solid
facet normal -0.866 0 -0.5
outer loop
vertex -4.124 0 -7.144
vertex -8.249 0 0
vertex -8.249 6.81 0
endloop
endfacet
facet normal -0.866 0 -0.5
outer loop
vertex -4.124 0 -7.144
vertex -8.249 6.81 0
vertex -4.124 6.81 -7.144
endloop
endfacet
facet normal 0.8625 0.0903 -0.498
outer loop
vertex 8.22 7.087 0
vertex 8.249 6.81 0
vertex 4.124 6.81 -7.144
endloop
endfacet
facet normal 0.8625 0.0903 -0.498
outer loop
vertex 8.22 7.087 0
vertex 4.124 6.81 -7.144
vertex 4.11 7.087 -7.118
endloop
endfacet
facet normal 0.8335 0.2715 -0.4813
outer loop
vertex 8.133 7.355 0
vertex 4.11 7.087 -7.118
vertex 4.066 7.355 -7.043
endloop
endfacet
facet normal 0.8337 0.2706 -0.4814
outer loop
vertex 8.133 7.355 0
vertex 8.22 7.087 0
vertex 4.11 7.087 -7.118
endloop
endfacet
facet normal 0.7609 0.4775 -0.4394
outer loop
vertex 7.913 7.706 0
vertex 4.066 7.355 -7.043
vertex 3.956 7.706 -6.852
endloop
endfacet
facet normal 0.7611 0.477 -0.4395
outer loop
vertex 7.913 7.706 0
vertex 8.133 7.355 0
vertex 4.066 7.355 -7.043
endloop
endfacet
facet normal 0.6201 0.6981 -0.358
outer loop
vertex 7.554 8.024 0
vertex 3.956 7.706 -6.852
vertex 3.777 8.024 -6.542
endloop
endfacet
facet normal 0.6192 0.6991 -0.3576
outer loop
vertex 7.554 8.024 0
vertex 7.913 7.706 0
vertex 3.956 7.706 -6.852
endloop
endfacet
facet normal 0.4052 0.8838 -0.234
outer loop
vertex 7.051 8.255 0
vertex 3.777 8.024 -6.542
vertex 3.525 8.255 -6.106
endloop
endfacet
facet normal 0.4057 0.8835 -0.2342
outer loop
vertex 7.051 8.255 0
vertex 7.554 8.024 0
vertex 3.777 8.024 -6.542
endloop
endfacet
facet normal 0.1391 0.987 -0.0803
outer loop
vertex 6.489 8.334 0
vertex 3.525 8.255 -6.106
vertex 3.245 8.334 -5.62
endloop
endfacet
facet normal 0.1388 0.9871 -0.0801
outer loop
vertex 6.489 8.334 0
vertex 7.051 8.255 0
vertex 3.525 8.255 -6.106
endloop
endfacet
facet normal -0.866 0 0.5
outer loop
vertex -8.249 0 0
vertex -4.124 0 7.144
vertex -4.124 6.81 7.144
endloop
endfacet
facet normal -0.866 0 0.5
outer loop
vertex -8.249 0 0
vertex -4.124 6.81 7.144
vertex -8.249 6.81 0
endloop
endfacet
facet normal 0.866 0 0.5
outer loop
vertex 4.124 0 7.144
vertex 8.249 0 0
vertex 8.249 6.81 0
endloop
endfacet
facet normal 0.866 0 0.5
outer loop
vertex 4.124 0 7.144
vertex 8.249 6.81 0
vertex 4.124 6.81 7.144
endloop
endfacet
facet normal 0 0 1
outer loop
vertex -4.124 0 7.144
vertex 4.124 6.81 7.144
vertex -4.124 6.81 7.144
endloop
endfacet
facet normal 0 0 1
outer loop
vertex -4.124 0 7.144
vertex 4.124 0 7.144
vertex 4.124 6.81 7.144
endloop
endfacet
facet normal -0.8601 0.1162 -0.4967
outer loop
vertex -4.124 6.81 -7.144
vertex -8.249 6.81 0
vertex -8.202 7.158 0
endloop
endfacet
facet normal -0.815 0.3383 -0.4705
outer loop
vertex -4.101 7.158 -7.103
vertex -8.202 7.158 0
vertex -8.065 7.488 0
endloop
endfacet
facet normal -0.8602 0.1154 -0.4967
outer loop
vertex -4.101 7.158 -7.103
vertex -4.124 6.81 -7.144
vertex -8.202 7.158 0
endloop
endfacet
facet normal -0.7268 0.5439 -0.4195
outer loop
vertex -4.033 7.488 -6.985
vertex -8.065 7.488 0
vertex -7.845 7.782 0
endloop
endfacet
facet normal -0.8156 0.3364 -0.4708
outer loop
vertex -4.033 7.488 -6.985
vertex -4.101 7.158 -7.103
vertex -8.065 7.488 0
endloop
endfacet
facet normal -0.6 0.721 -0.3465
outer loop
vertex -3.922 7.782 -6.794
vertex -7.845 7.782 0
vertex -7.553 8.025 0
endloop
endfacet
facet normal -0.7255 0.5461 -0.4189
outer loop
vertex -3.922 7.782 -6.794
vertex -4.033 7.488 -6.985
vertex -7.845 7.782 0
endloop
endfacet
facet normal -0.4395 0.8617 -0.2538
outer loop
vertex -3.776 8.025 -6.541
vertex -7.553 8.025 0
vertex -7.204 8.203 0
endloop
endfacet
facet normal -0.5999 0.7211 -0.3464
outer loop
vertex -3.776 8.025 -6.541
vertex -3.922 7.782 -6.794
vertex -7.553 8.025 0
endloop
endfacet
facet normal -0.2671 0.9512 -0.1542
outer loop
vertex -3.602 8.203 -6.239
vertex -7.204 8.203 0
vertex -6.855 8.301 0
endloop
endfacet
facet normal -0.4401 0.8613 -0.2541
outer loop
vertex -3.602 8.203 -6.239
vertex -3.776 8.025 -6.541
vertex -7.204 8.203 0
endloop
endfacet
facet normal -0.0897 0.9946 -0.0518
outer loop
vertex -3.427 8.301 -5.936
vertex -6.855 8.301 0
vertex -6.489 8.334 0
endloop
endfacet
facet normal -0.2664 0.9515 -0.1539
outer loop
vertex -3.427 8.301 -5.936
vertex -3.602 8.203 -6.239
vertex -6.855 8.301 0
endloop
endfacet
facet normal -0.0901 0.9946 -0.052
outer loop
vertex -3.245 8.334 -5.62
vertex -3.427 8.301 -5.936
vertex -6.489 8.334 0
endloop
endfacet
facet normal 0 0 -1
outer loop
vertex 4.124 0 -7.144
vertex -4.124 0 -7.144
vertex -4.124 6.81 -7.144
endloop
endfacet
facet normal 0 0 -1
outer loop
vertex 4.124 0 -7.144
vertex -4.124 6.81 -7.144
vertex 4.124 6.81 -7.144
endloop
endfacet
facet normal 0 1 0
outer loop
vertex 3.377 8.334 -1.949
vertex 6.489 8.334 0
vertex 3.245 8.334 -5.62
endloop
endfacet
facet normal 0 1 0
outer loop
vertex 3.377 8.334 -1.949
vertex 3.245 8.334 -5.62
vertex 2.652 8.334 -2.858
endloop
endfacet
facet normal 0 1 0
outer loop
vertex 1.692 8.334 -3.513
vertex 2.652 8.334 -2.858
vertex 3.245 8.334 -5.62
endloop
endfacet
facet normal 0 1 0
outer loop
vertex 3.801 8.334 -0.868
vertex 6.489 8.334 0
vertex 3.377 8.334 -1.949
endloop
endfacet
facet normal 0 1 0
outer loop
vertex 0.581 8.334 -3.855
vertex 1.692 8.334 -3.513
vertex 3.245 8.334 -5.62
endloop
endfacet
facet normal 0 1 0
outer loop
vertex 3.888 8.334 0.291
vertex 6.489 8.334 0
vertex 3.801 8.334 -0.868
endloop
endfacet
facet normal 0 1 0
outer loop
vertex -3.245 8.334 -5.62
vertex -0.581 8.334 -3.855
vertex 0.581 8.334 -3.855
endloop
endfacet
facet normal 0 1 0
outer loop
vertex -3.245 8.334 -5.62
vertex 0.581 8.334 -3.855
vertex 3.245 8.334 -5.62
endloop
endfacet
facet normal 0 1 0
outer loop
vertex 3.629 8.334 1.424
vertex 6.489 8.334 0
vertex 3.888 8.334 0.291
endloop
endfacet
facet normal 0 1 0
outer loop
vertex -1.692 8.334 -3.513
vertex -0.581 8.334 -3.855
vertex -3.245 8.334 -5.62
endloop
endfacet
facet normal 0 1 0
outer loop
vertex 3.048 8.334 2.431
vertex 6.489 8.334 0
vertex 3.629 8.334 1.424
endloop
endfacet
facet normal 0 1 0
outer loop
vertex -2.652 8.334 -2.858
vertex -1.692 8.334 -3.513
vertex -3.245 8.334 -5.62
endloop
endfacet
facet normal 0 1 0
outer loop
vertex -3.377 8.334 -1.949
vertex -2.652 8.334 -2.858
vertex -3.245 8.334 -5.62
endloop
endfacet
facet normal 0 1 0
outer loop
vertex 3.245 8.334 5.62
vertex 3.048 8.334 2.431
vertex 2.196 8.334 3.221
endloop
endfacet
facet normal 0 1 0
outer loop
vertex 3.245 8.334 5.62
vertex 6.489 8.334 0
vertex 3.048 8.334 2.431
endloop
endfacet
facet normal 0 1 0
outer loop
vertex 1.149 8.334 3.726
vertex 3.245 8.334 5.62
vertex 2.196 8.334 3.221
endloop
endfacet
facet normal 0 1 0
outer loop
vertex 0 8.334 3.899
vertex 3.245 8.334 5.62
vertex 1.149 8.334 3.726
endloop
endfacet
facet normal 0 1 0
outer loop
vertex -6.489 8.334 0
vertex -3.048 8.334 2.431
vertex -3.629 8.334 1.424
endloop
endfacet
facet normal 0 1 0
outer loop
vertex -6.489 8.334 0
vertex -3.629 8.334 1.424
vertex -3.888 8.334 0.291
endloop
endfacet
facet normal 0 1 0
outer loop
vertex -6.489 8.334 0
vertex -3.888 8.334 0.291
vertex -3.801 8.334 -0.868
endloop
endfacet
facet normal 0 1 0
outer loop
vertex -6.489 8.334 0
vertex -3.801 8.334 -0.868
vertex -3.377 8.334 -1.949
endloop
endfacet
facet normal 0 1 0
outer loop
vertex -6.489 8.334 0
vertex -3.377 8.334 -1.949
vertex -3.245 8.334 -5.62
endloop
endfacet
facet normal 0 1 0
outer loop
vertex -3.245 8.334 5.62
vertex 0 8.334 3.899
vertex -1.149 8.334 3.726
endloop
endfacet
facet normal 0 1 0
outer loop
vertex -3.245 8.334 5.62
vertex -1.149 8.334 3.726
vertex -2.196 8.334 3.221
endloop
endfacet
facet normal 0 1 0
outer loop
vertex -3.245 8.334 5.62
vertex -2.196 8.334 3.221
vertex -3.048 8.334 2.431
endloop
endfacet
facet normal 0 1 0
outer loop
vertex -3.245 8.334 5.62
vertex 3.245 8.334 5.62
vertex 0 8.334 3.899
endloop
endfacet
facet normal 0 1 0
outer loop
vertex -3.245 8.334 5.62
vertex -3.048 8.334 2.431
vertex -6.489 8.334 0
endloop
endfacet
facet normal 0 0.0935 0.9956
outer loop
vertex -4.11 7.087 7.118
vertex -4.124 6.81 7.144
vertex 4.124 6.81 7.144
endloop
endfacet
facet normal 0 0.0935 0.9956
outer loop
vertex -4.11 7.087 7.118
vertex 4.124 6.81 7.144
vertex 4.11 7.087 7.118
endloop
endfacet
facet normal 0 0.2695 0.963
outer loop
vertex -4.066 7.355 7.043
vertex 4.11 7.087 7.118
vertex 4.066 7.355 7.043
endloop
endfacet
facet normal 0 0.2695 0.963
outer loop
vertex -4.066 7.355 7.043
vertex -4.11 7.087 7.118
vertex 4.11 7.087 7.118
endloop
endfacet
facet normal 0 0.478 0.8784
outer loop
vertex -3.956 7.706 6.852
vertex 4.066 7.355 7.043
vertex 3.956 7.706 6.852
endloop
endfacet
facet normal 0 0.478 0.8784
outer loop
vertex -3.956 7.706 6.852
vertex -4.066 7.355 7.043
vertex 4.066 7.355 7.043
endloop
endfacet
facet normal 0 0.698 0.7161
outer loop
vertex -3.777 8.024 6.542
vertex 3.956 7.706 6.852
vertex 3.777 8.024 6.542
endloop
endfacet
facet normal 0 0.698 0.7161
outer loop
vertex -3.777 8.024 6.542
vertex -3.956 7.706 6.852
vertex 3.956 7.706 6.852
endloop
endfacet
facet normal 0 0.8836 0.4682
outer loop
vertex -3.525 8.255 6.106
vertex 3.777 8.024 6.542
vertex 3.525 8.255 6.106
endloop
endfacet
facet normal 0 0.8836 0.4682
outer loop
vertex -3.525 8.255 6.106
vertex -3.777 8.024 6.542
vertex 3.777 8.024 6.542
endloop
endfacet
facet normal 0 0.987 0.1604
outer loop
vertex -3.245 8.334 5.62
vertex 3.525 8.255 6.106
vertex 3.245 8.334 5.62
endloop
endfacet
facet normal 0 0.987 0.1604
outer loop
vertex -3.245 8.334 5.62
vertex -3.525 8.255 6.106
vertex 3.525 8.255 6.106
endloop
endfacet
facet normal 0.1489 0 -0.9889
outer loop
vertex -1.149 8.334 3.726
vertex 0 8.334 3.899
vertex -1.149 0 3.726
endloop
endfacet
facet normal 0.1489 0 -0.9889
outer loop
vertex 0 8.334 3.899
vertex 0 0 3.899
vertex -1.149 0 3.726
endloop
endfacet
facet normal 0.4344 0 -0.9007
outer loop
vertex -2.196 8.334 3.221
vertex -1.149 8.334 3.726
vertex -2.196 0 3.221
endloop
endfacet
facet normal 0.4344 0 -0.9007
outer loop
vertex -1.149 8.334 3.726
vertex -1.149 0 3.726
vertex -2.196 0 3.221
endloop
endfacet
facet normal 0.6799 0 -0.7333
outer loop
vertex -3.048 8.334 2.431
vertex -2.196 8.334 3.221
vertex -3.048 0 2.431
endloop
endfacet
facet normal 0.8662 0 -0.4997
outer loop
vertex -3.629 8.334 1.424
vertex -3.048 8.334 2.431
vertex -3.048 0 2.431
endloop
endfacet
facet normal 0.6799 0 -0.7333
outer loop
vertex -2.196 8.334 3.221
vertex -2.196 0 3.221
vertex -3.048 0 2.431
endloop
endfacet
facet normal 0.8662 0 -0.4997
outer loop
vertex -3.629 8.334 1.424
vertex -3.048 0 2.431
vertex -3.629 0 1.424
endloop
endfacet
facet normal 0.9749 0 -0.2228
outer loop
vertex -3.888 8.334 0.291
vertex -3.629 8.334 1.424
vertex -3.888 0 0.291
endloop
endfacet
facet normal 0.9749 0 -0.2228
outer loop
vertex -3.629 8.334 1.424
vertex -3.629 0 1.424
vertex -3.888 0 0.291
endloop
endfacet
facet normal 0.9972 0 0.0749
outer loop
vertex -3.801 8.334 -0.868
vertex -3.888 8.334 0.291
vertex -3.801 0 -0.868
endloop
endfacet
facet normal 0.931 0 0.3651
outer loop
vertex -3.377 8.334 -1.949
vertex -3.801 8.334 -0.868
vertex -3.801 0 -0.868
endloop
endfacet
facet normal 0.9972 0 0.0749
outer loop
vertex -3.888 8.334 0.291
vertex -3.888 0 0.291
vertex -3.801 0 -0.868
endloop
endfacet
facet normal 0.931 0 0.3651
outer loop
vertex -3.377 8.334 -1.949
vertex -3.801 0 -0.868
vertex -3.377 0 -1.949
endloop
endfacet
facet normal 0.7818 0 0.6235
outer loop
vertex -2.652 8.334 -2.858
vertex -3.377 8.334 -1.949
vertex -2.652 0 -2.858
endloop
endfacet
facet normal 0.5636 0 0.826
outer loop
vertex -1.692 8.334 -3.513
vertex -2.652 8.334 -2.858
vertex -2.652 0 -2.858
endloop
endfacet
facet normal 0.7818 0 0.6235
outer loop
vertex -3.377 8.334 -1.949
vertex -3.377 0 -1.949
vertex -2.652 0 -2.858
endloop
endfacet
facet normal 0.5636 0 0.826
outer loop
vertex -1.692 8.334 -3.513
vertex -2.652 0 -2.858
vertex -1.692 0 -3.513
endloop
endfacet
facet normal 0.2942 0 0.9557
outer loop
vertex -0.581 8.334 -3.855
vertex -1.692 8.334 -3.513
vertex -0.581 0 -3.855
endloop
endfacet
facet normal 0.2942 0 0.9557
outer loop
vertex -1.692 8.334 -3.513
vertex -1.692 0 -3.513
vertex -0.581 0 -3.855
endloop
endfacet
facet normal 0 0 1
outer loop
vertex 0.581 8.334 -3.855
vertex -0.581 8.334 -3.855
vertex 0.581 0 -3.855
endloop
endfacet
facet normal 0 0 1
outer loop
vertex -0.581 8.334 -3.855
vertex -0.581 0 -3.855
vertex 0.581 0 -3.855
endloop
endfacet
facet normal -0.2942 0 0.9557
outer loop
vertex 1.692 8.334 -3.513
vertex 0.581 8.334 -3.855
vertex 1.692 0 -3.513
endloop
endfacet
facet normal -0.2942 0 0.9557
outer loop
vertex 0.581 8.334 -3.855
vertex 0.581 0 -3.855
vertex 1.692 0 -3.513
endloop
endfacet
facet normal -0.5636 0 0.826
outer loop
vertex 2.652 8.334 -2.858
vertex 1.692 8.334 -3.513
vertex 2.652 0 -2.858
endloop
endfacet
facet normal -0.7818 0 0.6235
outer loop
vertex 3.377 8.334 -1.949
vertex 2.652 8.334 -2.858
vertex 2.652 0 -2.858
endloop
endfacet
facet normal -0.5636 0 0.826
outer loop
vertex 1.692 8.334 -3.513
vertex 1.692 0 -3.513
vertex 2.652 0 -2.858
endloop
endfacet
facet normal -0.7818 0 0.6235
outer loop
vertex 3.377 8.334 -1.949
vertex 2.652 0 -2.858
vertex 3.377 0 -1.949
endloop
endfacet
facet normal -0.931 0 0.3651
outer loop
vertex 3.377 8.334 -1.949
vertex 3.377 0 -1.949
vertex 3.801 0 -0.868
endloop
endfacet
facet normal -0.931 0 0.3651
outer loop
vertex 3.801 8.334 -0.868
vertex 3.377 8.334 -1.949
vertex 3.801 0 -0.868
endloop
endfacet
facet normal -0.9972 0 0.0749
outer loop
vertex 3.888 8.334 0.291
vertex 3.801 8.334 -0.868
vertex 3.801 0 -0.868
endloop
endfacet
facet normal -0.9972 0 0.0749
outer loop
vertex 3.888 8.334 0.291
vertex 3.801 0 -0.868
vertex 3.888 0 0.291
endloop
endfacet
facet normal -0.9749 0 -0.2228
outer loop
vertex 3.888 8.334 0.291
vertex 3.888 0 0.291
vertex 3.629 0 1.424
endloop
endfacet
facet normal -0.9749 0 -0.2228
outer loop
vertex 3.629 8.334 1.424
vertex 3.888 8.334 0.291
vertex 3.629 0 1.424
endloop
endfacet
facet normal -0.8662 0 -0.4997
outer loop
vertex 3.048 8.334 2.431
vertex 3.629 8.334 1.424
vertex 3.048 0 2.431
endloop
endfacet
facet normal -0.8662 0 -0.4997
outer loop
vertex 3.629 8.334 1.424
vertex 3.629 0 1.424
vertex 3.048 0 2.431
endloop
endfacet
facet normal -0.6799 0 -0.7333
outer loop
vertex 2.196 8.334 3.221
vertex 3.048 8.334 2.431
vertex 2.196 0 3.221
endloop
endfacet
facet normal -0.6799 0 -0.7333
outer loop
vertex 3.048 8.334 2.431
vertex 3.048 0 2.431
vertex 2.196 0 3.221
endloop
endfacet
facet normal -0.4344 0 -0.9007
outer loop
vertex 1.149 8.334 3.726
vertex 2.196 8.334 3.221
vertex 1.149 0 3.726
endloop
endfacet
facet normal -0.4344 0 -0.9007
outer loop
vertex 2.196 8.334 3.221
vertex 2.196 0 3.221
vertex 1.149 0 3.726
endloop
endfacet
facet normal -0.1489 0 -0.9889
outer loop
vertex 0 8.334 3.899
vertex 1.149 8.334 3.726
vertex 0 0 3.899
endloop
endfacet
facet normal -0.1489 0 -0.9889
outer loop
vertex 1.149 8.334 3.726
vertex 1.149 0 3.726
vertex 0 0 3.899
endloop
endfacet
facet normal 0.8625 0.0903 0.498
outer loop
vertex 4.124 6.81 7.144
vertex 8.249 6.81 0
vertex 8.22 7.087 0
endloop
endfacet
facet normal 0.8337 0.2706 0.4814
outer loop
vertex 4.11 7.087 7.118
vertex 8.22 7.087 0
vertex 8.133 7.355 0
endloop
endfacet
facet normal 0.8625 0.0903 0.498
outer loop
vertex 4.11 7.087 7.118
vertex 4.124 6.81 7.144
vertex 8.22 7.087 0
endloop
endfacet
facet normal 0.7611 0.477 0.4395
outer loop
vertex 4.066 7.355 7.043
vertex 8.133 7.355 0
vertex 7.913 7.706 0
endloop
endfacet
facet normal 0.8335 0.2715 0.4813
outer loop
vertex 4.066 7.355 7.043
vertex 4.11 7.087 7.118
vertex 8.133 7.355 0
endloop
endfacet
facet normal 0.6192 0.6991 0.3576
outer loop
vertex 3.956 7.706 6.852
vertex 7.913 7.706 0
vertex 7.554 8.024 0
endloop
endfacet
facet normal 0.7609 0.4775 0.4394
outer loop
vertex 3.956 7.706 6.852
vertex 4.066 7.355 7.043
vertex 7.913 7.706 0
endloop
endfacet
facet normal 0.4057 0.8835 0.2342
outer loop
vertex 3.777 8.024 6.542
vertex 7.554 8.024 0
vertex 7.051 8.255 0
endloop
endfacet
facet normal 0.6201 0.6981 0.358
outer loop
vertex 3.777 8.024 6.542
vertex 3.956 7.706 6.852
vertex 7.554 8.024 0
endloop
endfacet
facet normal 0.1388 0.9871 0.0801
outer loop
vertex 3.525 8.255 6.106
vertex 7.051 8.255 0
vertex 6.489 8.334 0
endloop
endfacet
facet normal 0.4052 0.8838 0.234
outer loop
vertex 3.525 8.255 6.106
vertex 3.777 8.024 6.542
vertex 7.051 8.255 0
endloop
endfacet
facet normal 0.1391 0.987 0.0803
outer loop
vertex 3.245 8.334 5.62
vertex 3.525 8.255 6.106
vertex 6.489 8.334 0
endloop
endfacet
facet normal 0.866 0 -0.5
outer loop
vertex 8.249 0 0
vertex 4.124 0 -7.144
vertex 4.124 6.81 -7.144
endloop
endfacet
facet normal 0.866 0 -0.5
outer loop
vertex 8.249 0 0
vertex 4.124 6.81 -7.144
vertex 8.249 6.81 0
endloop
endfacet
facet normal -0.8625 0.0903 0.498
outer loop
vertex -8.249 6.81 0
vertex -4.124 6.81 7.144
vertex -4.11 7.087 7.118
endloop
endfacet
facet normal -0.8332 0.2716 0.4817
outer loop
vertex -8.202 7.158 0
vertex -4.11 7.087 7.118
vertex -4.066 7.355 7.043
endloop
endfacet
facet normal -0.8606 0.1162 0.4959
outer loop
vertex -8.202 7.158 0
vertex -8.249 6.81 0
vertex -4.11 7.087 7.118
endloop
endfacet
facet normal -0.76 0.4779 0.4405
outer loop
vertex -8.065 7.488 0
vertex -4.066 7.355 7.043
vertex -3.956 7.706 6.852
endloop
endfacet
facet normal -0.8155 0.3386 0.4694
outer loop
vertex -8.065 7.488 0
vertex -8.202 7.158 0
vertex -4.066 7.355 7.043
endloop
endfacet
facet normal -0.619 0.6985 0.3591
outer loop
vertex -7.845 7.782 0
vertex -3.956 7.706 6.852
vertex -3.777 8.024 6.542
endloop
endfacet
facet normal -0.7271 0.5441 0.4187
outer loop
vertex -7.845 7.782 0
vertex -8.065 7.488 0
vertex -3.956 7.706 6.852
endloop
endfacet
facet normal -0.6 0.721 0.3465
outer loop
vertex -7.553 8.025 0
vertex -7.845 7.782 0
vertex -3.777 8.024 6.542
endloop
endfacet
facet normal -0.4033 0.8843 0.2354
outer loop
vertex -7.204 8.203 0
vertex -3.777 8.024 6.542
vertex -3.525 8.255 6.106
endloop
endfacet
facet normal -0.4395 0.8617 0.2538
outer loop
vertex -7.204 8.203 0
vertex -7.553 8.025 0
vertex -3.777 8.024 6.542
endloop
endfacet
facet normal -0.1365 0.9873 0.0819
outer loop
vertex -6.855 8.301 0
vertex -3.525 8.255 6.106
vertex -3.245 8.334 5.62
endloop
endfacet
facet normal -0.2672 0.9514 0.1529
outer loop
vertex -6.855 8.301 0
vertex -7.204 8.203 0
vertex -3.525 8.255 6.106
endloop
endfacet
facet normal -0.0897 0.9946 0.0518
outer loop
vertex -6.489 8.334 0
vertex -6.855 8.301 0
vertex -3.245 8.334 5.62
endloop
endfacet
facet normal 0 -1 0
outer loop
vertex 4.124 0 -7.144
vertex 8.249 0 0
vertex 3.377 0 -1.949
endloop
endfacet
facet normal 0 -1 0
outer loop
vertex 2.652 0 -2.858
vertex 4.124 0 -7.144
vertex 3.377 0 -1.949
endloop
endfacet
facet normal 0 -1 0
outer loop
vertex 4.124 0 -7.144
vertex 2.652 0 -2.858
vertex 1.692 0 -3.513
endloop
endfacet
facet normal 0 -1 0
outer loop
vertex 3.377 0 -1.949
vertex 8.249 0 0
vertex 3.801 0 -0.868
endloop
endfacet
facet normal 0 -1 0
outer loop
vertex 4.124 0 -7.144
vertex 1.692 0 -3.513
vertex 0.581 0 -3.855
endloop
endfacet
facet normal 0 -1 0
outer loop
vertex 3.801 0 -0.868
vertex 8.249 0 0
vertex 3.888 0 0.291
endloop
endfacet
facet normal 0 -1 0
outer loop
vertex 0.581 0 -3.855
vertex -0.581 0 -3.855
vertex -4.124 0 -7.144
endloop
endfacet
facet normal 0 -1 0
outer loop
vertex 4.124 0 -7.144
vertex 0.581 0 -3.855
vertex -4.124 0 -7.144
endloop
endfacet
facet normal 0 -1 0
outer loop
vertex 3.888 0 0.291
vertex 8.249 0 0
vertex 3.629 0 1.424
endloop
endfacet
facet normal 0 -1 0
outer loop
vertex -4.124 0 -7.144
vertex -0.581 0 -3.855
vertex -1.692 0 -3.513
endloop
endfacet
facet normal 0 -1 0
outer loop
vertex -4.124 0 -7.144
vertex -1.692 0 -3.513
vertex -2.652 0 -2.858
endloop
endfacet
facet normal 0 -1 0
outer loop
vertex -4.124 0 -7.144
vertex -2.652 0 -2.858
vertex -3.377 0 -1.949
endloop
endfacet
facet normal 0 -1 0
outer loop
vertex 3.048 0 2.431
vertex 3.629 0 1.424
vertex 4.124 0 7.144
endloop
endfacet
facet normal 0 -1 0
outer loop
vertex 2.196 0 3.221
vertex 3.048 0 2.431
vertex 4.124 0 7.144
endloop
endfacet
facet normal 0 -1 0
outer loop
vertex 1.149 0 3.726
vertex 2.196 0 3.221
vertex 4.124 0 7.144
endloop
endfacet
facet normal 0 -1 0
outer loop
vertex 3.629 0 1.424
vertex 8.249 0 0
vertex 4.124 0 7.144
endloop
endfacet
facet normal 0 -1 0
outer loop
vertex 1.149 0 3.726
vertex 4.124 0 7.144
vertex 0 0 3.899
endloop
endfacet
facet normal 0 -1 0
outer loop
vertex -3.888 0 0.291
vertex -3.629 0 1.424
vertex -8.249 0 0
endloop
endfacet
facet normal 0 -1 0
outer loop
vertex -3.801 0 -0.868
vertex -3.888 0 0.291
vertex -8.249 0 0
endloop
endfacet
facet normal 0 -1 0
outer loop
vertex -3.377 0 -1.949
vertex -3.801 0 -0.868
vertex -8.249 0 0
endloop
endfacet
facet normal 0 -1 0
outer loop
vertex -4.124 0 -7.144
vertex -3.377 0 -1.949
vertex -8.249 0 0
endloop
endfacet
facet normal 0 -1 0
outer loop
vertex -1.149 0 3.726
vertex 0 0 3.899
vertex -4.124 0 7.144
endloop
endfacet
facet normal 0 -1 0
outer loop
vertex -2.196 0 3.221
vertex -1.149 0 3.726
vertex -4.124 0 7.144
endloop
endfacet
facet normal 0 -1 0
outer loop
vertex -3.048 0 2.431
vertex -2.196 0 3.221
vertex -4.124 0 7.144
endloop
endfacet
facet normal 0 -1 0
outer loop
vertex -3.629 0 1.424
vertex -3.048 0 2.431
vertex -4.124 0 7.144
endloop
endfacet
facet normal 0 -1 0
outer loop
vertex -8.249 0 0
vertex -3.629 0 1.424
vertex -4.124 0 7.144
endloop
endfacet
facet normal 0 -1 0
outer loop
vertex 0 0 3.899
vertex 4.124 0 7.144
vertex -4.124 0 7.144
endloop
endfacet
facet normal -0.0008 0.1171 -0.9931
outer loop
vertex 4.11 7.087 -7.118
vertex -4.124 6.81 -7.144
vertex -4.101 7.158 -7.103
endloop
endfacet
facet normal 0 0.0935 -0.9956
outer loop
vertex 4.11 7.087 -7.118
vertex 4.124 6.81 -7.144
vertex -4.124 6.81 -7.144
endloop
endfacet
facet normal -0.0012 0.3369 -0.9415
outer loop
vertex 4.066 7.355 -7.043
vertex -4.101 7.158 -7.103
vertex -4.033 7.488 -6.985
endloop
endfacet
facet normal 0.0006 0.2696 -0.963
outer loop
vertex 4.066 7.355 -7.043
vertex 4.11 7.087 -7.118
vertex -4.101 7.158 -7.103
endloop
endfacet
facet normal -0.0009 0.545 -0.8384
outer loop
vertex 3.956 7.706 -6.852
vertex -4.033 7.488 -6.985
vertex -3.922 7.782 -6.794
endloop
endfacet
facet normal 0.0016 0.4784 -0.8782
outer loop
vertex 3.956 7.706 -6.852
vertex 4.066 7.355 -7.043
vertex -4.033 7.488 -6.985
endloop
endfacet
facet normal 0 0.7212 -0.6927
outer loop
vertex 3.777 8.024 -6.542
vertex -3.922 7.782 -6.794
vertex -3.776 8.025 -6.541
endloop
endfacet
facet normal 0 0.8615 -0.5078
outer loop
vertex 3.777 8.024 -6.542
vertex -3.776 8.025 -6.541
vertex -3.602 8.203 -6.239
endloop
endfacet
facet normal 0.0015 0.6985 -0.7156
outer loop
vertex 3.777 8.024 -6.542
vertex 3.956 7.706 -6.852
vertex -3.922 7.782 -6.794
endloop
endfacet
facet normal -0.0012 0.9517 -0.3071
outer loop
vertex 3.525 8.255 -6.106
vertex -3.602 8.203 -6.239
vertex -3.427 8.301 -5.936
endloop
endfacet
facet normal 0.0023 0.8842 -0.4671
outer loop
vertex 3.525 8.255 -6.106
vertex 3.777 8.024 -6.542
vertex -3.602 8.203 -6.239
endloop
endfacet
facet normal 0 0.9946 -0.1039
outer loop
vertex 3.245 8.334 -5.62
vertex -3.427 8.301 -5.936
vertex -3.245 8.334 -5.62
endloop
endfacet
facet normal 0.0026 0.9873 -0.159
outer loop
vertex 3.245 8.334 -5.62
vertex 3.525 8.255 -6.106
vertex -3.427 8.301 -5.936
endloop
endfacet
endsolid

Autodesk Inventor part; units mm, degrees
ref_plane "YZ Plane" through (0, 0, 0) normal (1, 0, 0) x (0, 1, 0)
ref_plane "XZ Plane" through (0, 0, 0) normal (0, 1, 0) x (-1, 0, 0)
ref_plane "XY Plane" through (0, 0, 0) normal (0, 0, 1) x (1, 0, 0)
sketch "Sketch1" plane through (0, 0, 0) normal (0, 1, 0) x (-1, 0, 0)
  line L0 (8.2489, 0) -> (4.1244, -7.1437)
  line L1 (4.1244, -7.1437) -> (-4.1244, -7.1437)
  line L2 (-4.1244, -7.1437) -> (-8.2489, 0)
  line L3 (-8.2489, 0) -> (-4.1244, 7.1437)
  line L4 (-4.1244, 7.1437) -> (4.1244, 7.1437)
  line L5 (4.1244, 7.1437) -> (8.2489, 0)
  point P0 (0, 0)
  point P1 (0, 0)
  dimension "d0" = 14.2875
extrude "Extrusion1" add sketch "Sketch1" along normal blind 8.3344
sketch "Sketch2" plane through (0, 8.3344, 0) normal (0, 1, 0) x (1, 0, 0)
  circle A0 centre (0, 0) radius 4.7625
  dimension "d3" = 9.525
hole "Hole1" at (0, 8.3344, 0) direction (0, -1, 0) diameter 7.7978 end through all thread size "3/8-16 UNC" class "2B" standard "ANSI Unified Screw Threads"
fillet "Fillet1" radius 1.524 6 edges at (0, 8.3344, 7.1437) (6.1867, 8.3344, 3.5719) (6.1867, 8.3344, -3.5719) (0, 8.3344, -7.1437) (-6.1867, 8.3344, -3.5719) (-6.1867, 8.3344, 3.5719)
properties part number "0nut_ss_375" material "Stainless Steel"
